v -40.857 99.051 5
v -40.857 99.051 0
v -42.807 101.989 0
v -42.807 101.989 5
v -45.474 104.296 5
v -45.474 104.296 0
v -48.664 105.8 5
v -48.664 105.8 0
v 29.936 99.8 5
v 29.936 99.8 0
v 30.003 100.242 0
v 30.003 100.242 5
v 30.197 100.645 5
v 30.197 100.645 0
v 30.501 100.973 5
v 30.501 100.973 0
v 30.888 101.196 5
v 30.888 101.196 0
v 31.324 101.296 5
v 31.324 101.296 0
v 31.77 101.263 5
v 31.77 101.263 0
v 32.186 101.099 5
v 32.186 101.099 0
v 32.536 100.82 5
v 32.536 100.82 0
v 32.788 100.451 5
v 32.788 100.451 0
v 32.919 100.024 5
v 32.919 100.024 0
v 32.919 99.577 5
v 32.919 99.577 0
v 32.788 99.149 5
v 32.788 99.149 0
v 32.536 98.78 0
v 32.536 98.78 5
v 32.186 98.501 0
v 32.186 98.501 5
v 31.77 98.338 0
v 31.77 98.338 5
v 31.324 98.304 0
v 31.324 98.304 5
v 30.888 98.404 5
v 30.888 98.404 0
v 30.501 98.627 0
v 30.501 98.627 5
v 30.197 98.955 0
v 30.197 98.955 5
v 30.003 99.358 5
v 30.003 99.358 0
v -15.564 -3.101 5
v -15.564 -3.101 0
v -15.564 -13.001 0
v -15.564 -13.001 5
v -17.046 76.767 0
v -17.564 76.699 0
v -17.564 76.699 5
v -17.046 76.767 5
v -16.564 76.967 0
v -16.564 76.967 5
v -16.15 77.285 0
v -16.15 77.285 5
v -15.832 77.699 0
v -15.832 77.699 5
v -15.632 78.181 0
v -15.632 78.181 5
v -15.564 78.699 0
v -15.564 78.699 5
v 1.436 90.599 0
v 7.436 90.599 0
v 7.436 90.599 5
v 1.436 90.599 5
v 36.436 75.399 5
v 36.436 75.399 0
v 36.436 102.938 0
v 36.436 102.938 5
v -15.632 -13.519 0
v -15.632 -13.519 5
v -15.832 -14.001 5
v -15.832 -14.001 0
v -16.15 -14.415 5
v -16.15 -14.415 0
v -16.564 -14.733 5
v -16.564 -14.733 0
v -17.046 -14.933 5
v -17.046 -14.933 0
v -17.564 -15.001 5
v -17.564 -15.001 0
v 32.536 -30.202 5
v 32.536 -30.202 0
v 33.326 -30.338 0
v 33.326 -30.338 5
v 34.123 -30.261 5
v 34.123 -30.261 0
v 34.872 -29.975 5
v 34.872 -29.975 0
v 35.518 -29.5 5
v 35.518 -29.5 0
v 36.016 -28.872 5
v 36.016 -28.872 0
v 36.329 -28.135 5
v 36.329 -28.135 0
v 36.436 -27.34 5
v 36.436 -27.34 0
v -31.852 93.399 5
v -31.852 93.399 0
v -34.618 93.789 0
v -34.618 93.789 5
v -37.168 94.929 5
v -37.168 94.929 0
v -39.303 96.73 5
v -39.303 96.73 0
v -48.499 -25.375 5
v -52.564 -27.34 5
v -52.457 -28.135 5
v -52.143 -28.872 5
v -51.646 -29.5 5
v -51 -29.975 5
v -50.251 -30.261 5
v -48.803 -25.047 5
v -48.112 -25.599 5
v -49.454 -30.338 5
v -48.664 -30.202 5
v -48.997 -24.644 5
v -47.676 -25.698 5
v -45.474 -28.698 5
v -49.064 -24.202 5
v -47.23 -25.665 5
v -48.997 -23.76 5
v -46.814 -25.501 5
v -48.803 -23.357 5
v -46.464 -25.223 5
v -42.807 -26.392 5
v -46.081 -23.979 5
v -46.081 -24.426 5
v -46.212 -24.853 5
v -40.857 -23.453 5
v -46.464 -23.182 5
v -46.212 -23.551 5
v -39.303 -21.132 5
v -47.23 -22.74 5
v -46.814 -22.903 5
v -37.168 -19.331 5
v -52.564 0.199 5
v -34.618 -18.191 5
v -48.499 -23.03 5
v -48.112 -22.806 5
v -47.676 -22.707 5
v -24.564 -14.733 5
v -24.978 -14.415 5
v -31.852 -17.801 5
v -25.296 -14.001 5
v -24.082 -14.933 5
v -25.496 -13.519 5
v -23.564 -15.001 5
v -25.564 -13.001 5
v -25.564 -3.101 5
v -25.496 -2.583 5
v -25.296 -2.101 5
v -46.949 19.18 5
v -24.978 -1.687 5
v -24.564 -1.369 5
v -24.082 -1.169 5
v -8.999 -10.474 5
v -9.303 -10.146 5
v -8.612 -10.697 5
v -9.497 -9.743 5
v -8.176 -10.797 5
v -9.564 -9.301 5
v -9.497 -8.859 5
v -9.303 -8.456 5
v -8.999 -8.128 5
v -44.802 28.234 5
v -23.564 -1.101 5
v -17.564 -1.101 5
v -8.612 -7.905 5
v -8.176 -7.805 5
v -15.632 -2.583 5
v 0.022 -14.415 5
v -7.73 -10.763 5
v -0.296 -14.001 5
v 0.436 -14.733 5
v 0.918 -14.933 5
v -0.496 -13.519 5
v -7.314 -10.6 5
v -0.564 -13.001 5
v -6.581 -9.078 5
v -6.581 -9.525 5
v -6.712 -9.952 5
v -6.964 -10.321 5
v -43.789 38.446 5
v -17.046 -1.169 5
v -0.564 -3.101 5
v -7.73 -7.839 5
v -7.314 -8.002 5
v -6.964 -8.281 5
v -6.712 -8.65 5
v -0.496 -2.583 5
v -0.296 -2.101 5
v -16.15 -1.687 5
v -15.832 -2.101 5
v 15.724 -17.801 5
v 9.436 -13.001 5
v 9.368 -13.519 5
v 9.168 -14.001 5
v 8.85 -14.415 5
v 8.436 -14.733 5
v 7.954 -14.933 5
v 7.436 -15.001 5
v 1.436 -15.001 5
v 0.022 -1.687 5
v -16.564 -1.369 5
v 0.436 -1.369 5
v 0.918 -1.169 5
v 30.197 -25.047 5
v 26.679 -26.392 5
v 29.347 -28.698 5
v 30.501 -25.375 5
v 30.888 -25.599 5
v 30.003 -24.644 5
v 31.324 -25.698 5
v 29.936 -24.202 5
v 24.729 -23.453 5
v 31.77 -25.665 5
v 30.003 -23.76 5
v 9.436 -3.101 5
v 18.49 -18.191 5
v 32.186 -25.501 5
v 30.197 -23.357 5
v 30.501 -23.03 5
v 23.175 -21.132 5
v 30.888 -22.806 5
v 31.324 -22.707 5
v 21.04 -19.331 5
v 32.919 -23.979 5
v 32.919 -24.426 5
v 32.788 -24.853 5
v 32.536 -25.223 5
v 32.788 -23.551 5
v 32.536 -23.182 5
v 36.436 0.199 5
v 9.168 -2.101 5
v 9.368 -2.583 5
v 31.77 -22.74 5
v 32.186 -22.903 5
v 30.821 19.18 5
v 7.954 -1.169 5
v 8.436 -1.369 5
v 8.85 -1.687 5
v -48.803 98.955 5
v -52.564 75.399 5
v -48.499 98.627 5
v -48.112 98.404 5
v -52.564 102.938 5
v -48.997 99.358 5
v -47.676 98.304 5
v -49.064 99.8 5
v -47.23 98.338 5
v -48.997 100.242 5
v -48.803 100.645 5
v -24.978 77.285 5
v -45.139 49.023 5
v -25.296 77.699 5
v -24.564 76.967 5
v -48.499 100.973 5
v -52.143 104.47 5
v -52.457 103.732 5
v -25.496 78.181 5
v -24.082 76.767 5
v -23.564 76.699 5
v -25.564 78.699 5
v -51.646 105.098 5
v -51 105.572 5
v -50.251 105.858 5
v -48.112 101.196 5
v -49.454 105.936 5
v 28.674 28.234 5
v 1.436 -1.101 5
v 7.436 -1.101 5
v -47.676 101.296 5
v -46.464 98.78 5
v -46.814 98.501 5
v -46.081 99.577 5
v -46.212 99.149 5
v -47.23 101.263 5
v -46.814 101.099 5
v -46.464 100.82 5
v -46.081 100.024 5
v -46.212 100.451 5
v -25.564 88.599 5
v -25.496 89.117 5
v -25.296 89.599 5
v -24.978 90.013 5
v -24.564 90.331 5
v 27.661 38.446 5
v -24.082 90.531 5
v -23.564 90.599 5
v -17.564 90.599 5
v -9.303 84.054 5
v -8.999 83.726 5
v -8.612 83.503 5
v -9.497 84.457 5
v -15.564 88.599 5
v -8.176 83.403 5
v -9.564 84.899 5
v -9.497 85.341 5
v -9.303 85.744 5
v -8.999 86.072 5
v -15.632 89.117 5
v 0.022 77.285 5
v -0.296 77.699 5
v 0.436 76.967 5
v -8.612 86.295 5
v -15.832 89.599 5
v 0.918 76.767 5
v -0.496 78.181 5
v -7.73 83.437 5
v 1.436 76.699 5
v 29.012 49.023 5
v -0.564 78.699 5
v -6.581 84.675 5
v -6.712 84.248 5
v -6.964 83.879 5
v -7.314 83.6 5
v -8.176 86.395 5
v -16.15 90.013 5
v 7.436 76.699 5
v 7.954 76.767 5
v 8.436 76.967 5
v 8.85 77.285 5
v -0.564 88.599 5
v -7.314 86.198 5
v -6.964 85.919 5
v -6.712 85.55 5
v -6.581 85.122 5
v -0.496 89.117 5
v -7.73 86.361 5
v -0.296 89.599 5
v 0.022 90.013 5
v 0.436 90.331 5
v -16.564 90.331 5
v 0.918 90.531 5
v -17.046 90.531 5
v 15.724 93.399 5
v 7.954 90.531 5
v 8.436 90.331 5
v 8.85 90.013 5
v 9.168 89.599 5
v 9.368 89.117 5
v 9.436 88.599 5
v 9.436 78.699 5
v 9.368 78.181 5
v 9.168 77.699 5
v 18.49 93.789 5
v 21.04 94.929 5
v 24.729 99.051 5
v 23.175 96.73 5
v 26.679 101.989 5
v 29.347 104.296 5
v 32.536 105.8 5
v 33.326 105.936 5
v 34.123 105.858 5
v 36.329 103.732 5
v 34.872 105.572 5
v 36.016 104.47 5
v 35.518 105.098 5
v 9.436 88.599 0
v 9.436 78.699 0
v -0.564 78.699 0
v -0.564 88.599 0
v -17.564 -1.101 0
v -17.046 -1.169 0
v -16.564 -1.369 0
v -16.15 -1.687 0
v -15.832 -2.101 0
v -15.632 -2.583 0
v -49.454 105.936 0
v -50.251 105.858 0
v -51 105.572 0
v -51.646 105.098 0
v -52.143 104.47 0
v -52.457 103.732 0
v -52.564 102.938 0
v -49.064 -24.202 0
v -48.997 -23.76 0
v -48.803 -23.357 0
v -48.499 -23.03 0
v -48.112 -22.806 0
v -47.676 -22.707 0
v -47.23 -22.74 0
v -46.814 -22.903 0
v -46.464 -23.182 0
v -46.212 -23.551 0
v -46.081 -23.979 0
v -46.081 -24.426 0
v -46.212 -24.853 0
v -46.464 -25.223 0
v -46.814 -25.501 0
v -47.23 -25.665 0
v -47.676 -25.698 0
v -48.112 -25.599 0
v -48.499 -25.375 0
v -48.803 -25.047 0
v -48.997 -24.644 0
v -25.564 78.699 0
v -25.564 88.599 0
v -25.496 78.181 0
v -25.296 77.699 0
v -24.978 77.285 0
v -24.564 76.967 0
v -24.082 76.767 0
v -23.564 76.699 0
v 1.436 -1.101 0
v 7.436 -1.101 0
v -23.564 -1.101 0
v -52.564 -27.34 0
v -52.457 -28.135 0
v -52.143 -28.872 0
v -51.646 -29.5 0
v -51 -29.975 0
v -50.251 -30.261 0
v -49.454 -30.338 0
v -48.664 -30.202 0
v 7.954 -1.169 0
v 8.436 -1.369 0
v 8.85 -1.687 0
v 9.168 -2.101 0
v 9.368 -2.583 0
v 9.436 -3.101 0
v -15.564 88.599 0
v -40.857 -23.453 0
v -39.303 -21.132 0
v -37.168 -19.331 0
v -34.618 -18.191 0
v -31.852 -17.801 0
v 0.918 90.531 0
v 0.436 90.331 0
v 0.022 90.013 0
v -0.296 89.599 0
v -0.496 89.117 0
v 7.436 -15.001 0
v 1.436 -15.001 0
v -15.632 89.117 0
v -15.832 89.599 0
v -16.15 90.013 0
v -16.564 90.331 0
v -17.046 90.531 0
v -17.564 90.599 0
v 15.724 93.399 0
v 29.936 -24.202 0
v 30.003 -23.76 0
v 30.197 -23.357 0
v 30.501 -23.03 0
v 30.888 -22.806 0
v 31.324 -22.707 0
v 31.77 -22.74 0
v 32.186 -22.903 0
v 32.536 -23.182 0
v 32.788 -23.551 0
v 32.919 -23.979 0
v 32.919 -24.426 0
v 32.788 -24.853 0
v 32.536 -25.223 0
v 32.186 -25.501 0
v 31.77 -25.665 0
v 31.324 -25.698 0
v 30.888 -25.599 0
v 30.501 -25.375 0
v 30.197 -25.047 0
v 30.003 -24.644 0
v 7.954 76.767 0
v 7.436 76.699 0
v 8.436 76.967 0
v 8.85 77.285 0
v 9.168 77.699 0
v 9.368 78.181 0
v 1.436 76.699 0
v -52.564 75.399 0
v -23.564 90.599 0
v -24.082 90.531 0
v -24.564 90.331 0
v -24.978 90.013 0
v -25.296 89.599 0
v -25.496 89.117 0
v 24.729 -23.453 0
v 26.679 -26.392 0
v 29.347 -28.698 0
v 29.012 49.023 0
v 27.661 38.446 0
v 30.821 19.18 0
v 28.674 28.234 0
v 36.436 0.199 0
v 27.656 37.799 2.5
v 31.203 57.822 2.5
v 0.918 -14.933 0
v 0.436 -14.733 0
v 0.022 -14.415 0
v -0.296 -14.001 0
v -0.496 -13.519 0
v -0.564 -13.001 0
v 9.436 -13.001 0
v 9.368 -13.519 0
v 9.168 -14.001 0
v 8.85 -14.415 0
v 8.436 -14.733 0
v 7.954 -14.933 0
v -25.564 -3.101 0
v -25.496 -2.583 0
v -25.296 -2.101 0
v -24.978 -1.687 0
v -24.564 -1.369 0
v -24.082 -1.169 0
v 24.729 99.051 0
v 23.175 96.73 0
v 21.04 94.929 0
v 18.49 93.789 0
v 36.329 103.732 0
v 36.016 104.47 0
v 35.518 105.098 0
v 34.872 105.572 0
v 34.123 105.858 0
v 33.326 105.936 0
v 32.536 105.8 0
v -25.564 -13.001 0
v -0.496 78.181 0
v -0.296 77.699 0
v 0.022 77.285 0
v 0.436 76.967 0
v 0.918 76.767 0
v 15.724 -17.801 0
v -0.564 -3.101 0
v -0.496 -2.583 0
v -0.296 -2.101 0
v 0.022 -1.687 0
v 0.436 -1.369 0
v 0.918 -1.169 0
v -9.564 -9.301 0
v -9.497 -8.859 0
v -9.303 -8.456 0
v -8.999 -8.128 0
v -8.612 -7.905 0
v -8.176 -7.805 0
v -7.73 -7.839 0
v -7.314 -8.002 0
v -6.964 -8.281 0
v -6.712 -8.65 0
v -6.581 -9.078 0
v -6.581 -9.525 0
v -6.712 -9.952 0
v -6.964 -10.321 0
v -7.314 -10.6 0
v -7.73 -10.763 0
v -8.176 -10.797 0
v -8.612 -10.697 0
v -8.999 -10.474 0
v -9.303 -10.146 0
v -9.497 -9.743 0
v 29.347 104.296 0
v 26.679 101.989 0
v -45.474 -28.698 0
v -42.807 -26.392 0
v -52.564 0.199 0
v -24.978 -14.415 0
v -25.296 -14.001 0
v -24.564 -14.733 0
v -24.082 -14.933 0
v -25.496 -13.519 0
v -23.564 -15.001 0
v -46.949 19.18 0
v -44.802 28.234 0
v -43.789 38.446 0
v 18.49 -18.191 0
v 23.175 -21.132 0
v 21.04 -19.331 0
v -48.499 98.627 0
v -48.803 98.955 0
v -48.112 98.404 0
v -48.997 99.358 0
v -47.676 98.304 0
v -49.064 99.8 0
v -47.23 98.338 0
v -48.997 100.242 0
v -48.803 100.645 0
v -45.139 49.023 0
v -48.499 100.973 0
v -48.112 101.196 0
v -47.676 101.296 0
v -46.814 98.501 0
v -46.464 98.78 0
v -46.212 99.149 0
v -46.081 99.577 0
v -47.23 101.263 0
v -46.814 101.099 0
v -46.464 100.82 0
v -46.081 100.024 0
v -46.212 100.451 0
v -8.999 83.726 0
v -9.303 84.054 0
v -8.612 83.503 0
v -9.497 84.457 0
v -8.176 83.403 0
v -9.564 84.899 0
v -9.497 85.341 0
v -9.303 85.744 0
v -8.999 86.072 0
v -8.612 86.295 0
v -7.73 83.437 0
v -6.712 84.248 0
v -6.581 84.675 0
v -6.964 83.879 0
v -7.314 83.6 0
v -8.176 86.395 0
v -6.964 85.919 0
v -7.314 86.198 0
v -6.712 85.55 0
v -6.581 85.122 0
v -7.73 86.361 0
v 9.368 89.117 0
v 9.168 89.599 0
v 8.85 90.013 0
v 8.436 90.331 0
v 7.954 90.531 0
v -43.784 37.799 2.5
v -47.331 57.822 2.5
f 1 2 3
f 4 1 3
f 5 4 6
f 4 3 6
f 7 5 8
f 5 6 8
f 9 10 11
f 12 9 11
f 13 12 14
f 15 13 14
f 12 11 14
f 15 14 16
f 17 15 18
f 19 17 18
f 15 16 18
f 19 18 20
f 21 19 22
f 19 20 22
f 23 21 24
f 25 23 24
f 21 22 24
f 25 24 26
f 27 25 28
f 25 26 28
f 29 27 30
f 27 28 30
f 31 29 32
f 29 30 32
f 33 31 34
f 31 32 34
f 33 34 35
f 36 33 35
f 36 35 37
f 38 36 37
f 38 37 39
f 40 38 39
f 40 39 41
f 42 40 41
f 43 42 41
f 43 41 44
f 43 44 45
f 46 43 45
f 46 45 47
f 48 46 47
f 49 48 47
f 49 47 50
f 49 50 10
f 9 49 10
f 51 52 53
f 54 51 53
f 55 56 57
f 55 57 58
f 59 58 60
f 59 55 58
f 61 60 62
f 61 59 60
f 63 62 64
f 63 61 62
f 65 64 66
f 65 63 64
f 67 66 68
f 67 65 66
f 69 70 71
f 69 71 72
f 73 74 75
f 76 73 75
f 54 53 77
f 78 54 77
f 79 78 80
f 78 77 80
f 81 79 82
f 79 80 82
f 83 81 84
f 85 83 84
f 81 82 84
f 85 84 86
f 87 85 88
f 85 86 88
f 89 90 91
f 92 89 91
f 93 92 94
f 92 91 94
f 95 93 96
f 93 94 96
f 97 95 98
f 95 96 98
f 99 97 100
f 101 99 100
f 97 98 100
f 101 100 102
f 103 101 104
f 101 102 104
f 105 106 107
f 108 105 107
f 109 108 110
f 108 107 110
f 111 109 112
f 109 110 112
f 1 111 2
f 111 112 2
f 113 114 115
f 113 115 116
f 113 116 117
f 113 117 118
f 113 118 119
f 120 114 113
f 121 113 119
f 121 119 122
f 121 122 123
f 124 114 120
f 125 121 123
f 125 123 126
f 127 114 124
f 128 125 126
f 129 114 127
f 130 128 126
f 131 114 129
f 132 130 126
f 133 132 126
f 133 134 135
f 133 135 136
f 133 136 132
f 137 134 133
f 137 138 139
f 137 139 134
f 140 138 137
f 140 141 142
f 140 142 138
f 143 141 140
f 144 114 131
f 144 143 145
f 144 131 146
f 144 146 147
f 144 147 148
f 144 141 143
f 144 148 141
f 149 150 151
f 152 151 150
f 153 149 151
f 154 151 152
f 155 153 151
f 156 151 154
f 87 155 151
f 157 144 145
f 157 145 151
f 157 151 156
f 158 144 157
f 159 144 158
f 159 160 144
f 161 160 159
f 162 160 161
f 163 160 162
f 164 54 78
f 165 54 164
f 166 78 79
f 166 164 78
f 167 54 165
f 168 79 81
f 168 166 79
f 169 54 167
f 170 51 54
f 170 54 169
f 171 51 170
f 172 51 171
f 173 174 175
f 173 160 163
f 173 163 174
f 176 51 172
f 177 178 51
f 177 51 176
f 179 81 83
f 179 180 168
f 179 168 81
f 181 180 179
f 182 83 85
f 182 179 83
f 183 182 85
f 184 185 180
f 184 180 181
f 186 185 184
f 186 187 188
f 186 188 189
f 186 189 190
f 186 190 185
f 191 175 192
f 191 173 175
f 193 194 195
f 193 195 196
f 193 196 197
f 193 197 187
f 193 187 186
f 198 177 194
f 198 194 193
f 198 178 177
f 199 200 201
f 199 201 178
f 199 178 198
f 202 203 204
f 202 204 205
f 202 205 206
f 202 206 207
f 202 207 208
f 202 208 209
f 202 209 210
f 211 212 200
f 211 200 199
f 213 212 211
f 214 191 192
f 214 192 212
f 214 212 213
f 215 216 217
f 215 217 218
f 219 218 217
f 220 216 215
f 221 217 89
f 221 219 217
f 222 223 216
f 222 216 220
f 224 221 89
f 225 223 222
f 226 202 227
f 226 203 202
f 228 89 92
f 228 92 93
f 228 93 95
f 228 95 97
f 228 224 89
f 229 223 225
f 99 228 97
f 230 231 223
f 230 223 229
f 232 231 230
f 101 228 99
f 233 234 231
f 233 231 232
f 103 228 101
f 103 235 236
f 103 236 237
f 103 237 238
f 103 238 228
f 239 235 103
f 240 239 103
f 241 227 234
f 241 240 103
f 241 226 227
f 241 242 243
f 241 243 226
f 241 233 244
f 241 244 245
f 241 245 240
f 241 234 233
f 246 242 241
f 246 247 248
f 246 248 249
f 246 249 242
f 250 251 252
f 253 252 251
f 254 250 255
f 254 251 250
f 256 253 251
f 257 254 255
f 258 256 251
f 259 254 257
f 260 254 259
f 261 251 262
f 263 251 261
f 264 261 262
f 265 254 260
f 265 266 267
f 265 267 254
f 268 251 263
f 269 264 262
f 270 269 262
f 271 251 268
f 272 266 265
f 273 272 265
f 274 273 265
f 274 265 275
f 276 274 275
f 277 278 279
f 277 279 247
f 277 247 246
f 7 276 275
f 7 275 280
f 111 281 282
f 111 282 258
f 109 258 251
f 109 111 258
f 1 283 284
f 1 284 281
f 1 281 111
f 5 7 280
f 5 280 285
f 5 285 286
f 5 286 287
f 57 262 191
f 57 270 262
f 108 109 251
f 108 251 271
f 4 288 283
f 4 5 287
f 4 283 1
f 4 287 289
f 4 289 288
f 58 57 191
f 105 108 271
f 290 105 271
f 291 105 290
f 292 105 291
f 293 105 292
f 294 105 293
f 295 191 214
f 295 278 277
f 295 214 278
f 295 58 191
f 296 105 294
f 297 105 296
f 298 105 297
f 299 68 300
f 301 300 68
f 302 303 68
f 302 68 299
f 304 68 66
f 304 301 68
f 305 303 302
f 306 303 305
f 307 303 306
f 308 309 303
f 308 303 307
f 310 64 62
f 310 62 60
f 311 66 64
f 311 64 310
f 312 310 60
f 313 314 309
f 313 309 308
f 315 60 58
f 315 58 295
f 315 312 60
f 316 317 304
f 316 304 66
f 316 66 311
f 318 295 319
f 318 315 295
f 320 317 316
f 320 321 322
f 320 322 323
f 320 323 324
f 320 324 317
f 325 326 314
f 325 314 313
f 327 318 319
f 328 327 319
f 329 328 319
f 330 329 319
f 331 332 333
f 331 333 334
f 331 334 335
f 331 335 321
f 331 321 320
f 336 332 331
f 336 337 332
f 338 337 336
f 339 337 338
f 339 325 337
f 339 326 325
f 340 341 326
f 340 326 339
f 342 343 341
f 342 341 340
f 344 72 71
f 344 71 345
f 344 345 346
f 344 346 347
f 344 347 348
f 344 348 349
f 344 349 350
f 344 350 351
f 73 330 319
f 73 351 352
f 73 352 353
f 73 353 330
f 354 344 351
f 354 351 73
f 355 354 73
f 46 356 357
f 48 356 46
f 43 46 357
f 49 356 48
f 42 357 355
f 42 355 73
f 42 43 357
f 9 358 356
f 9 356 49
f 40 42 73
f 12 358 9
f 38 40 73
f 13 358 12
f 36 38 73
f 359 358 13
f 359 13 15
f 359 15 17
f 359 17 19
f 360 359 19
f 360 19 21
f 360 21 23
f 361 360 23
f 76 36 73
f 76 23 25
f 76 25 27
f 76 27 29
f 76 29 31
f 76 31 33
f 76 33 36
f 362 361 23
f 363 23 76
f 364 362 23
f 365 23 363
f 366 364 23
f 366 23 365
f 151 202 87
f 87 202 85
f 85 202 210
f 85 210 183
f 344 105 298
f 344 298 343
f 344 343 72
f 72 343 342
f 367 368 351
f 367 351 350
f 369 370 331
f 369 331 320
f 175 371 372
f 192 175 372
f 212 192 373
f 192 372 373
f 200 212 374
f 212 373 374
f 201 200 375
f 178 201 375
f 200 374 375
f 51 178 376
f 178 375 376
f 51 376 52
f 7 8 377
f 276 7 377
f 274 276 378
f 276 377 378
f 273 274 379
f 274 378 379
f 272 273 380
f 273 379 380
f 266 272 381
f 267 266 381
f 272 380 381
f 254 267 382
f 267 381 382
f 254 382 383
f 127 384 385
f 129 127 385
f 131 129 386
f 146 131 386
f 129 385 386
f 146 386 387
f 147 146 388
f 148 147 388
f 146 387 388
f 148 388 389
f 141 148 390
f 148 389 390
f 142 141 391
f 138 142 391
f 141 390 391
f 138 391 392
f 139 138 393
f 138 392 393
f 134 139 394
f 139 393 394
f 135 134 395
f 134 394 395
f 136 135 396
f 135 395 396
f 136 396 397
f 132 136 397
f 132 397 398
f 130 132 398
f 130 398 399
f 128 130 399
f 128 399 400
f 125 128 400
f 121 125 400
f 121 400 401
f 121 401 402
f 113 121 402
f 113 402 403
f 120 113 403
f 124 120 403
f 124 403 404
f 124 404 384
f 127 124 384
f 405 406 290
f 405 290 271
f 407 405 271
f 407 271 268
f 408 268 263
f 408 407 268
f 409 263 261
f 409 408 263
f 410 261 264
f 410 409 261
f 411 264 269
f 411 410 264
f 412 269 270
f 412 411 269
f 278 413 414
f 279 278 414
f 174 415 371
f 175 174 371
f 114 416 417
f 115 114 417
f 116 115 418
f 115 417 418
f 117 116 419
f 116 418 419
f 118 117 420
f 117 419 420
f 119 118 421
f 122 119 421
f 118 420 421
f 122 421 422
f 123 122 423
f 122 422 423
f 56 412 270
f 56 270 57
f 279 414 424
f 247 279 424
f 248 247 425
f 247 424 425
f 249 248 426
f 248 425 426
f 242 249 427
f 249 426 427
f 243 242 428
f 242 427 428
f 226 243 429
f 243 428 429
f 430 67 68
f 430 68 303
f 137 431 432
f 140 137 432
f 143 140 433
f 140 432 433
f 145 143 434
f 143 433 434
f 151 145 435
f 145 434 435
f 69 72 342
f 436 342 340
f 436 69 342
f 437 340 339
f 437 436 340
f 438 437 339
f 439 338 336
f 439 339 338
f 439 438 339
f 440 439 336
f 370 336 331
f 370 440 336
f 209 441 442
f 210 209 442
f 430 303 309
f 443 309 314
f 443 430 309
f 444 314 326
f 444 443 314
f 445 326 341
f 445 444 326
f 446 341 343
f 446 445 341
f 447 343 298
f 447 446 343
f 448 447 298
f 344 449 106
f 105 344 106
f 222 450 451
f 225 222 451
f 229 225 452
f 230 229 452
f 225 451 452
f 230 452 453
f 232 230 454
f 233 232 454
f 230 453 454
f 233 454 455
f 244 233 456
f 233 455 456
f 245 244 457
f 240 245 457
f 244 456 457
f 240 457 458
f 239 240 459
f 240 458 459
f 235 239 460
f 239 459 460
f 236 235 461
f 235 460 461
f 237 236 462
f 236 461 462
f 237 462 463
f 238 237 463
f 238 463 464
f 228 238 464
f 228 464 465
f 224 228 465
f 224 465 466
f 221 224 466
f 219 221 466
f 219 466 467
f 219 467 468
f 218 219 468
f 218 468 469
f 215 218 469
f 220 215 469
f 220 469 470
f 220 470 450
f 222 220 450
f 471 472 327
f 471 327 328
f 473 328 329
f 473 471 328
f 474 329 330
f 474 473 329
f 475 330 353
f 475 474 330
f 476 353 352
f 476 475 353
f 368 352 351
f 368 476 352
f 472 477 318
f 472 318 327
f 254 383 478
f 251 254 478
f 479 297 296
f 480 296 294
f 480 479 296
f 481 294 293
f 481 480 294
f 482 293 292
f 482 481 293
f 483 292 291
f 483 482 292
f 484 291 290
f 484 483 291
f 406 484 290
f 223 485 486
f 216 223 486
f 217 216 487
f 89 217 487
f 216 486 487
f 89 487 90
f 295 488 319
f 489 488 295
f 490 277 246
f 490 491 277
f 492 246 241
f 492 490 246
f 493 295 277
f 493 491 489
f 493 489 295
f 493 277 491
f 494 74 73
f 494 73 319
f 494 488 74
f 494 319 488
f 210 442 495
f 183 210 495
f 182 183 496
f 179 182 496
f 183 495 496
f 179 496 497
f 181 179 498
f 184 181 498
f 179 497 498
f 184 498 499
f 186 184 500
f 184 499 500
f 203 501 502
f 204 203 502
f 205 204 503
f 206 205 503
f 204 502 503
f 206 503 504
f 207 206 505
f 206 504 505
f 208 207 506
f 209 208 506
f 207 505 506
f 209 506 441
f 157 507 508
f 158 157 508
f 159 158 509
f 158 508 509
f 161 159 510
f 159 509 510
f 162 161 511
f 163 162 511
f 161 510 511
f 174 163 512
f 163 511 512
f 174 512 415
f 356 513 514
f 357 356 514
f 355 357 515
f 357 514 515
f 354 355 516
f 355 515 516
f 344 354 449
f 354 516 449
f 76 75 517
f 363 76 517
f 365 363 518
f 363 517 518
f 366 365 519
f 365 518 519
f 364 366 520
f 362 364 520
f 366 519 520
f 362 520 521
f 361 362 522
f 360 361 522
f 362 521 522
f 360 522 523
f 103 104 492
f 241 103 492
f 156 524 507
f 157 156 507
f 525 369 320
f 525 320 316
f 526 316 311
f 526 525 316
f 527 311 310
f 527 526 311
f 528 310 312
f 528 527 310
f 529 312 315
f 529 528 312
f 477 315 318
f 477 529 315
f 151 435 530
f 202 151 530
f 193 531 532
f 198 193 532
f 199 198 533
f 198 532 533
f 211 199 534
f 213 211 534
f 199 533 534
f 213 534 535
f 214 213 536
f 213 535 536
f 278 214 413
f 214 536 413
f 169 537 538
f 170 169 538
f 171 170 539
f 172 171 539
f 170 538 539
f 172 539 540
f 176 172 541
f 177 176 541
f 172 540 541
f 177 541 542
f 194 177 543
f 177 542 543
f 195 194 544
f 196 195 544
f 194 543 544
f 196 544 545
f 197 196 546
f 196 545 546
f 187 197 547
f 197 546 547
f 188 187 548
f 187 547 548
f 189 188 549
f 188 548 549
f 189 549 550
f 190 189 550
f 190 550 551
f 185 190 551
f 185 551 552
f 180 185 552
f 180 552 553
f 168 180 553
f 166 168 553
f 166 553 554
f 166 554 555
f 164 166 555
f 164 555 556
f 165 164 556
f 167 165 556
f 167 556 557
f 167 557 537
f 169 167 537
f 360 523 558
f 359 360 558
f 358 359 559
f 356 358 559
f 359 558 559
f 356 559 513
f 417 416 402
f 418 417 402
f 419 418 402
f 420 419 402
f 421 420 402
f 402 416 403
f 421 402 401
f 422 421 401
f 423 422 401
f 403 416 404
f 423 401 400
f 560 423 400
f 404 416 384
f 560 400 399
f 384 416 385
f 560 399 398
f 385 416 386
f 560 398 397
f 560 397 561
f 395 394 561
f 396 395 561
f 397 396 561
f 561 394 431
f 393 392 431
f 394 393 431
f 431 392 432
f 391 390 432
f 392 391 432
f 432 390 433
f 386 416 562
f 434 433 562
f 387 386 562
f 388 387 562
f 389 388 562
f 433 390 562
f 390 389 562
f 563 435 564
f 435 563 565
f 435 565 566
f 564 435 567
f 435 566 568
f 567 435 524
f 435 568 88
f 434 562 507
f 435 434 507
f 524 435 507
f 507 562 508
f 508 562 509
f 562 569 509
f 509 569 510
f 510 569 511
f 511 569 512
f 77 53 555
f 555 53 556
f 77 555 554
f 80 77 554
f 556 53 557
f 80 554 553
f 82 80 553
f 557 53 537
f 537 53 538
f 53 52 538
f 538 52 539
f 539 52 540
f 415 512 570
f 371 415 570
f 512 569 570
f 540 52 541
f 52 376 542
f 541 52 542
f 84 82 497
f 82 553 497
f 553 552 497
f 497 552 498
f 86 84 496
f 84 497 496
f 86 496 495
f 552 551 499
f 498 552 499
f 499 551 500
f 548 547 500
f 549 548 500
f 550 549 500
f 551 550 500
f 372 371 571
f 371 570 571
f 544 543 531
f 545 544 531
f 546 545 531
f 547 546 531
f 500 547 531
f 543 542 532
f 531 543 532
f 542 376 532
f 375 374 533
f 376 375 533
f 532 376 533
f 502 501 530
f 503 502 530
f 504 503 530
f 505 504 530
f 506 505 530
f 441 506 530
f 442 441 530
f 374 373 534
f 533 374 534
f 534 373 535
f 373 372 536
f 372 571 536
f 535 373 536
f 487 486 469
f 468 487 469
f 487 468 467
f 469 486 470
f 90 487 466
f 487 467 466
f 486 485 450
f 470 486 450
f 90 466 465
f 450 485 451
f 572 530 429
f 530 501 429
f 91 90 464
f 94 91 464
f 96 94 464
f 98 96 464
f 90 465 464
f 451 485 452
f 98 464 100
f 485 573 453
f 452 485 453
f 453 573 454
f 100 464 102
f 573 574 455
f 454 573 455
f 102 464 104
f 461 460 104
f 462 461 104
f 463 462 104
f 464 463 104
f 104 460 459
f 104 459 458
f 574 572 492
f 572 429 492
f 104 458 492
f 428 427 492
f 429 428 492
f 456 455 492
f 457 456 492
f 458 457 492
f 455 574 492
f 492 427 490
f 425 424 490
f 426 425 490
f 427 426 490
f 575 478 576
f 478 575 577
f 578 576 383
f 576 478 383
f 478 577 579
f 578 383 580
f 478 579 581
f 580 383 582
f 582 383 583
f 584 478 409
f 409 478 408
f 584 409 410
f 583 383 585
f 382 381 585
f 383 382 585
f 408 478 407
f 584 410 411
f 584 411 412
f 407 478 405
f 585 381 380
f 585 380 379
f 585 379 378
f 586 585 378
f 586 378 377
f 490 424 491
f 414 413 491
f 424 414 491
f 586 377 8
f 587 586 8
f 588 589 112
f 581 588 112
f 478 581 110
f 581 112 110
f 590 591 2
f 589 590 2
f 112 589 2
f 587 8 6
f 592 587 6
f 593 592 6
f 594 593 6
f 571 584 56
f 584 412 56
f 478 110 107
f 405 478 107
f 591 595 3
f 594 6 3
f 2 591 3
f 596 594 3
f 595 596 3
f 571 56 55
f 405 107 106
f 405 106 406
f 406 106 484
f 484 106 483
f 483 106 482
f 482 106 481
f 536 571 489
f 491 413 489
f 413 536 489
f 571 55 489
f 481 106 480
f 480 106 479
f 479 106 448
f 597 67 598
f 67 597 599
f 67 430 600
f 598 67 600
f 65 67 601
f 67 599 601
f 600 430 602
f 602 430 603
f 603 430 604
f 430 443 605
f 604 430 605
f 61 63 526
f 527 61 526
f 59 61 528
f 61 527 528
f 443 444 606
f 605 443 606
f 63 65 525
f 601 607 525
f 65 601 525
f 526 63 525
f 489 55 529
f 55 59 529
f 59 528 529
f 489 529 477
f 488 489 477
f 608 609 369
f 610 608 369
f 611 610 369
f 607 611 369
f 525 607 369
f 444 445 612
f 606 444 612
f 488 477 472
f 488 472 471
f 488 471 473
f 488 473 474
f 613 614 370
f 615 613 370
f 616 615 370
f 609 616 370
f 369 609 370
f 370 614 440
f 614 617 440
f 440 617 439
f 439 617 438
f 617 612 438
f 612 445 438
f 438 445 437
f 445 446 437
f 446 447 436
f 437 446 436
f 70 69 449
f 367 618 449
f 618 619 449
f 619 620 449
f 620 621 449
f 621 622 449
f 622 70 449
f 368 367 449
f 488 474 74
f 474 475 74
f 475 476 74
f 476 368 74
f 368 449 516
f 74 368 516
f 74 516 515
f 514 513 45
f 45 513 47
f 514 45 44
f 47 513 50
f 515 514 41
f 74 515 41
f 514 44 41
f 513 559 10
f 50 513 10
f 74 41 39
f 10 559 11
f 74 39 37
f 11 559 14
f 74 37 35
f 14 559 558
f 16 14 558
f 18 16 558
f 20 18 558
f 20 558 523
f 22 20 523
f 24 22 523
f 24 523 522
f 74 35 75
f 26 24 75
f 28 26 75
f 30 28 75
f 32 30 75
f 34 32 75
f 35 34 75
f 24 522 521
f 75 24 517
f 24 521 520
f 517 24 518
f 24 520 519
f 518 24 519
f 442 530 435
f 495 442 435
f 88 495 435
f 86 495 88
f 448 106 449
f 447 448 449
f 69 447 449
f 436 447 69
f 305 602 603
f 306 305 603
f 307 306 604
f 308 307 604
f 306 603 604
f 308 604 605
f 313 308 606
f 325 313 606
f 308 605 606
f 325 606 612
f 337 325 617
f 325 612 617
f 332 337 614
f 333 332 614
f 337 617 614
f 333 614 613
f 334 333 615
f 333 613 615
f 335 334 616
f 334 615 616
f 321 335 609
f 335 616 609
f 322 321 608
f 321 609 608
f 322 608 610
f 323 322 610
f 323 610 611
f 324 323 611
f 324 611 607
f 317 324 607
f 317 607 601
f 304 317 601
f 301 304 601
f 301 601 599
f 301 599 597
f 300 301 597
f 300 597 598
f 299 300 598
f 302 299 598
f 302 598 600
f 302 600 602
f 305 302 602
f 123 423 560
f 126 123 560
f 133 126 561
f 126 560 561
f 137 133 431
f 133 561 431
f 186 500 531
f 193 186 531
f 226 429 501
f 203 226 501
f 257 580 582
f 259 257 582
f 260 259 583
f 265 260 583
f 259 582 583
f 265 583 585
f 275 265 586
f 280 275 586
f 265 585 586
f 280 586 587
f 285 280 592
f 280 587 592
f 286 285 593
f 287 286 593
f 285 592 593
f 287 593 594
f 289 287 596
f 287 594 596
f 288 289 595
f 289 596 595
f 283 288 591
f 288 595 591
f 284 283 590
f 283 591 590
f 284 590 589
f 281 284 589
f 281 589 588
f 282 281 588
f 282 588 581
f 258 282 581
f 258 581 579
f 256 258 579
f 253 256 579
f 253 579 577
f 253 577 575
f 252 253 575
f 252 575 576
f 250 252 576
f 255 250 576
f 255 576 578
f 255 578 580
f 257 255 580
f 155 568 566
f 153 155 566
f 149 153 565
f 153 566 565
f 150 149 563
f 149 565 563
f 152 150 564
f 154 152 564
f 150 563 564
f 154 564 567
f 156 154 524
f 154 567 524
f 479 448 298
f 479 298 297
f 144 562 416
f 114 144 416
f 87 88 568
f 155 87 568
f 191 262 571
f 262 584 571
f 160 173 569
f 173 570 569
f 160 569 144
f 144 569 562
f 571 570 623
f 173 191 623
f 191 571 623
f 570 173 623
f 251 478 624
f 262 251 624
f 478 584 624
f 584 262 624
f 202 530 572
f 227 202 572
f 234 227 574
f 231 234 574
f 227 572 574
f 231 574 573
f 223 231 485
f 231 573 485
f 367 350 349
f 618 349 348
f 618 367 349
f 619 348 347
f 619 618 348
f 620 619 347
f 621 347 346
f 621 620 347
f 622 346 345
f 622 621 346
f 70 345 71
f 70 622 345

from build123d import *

# Parameters (mm, degrees)
RESSALTO_EXTRUS_O3_DEPTH = 5
ESBO_O4_R                = 1.5
CORTE_EXTRUS_O3_DEPTH    = 10


with BuildPart() as part:
    # Esboço1 → Ressalto-extrusão3 (new body)
    with BuildSketch(Plane.XY):
        with BuildLine():
            Line((-31.851570772, -17.801096987), (-27.063885949, -17.801096987))
            Line((-27.063885949, -17.801096987), (10.936114051, -17.801096987))
            Line((10.936114051, -17.801096987), (15.723798874, -17.801096987))
            ThreePointArc((15.723798874, -17.801096987), (21.039894205, -19.331201448), (24.729153299, -23.4532709))
            ThreePointArc((24.729153299, -23.4532709), (27.934250919, -27.635644423), (32.536114051, -30.202306605))
            ThreePointArc((32.536114051, -30.202306605), (35.210937986, -29.759166326), (36.436114051, -27.340489001))
            Line((36.436114051, -27.340489001), (36.436114051, -17.801096987))
            Line((36.436114051, -17.801096987), (36.436114051, 0.198903013))
            add(Edge.make_bspline(
                [(36.436114051, 75.398903013), (24.729153299, 37.798903013), (36.436114051, 0.198903013)],
                knots=[0, 0, 0, 1, 1, 1], degree=2, weights=[1, 3, 1]))
            Line((36.436114051, 75.398903013), (36.436114051, 93.398903013))
            Line((36.436114051, 93.398903013), (36.436114051, 102.938295027))
            ThreePointArc((36.436114051, 102.938295027), (35.210937986, 105.356972352), (32.536114051, 105.800112631))
            ThreePointArc((32.536114051, 105.800112631), (27.934250919, 103.23345045), (24.729153299, 99.051076926))
            ThreePointArc((24.729153299, 99.051076926), (21.039894205, 94.929007474), (15.723798874, 93.398903013))
            Line((15.723798874, 93.398903013), (10.936114051, 93.398903013))
            Line((10.936114051, 93.398903013), (-27.063885949, 93.398903013))
            Line((-27.063885949, 93.398903013), (-31.851570772, 93.398903013))
            ThreePointArc((-31.851570772, 93.398903013), (-37.167666102, 94.929007474), (-40.856925197, 99.051076926))
            ThreePointArc((-40.856925197, 99.051076926), (-44.062022817, 103.23345045), (-48.663885949, 105.800112631))
            ThreePointArc((-48.663885949, 105.800112631), (-51.338709884, 105.356972352), (-52.563885949, 102.938295027))
            Line((-52.563885949, 102.938295027), (-52.563885949, 93.398903013))
            Line((-52.563885949, 93.398903013), (-52.563885949, 75.398903013))
            add(Edge.make_bspline(
                [(-52.563885949, 75.398903013), (-40.856925197, 37.798903013), (-52.563885949, 0.198903013)],
                knots=[0, 0, 0, 1, 1, 1], degree=2, weights=[1, 3, 1]))
            Line((-52.563885949, 0.198903013), (-52.563885949, -17.801096987))
            Line((-52.563885949, -17.801096987), (-52.563885949, -27.340489001))
            ThreePointArc((-52.563885949, -27.340489001), (-51.338709884, -29.759166326), (-48.663885949, -30.202306605))
            ThreePointArc((-48.663885949, -30.202306605), (-44.062022817, -27.635644423), (-40.856925197, -23.4532709))
            ThreePointArc((-40.856925197, -23.4532709), (-37.167666102, -19.331201448), (-31.851570772, -17.801096987))
        make_face()
    extrude(amount=RESSALTO_EXTRUS_O3_DEPTH)

    # Esboço4 → Corte-extrusão3 (cut)
    with BuildSketch(Plane(origin=(0, 0, 0), x_dir=(-1, 0, 0), z_dir=(0, 0, -1))):
        with Locations((-31.436114051, 99.800112631)):
            Circle(ESBO_O4_R)
        with Locations((47.563885949, 99.800112631)):
            Circle(ESBO_O4_R)
        with Locations((8.063885949, 84.898903013)):
            Circle(ESBO_O4_R)
        with Locations((8.063885949, -9.301096987)):
            Circle(ESBO_O4_R)
        with Locations((47.563885949, -24.202306605)):
            Circle(ESBO_O4_R)
        with Locations((-31.436114051, -24.202306605)):
            Circle(ESBO_O4_R)
        with BuildLine():
            Line((-7.436114051, 90.598903013), (-1.436114051, 90.598903013))
            ThreePointArc((-1.436114051, 90.598903013), (-0.021900489, 90.013116575), (0.563885949, 88.598903013))
            Line((0.563885949, 88.598903013), (0.563885949, 78.698903013))
            ThreePointArc((0.563885949, 78.698903013), (-0.021900489, 77.284689451), (-1.436114051, 76.698903013))
            Line((-1.436114051, 76.698903013), (-7.436114051, 76.698903013))
            ThreePointArc((-7.436114051, 76.698903013), (-8.850327613, 77.284689451), (-9.436114051, 78.698903013))
            Line((-9.436114051, 78.698903013), (-9.436114051, 88.598903013))
            ThreePointArc((-9.436114051, 88.598903013), (-8.850327613, 90.013116575), (-7.436114051, 90.598903013))
        make_face()
        with BuildLine():
            Line((17.563885949, 90.598903013), (23.563885949, 90.598903013))
            ThreePointArc((23.563885949, 90.598903013), (24.978099511, 90.013116575), (25.563885949, 88.598903013))
            Line((25.563885949, 88.598903013), (25.563885949, 78.698903013))
            ThreePointArc((25.563885949, 78.698903013), (24.978099511, 77.284689451), (23.563885949, 76.698903013))
            Line((23.563885949, 76.698903013), (17.563885949, 76.698903013))
            ThreePointArc((17.563885949, 76.698903013), (16.149672387, 77.284689451), (15.563885949, 78.698903013))
            Line((15.563885949, 78.698903013), (15.563885949, 88.598903013))
            ThreePointArc((15.563885949, 88.598903013), (16.149672387, 90.013116575), (17.563885949, 90.598903013))
        make_face()
        with BuildLine():
            Line((25.563885949, -13.001096987), (25.563885949, -3.101096987))
            ThreePointArc((25.563885949, -3.101096987), (24.978099511, -1.686883425), (23.563885949, -1.101096987))
            Line((23.563885949, -1.101096987), (17.563885949, -1.101096987))
            ThreePointArc((17.563885949, -1.101096987), (16.149672387, -1.686883425), (15.563885949, -3.101096987))
            Line((15.563885949, -3.101096987), (15.563885949, -13.001096987))
            ThreePointArc((15.563885949, -13.001096987), (16.149672387, -14.415310549), (17.563885949, -15.001096987))
            Line((17.563885949, -15.001096987), (23.563885949, -15.001096987))
            ThreePointArc((23.563885949, -15.001096987), (24.978099511, -14.415310549), (25.563885949, -13.001096987))
        make_face()
        with BuildLine():
            Line((0.563885949, -13.001096987), (0.563885949, -3.101096987))
            ThreePointArc((0.563885949, -3.101096987), (-0.021900489, -1.686883425), (-1.436114051, -1.101096987))
            Line((-1.436114051, -1.101096987), (-7.436114051, -1.101096987))
            ThreePointArc((-7.436114051, -1.101096987), (-8.850327613, -1.686883425), (-9.436114051, -3.101096987))
            Line((-9.436114051, -3.101096987), (-9.436114051, -13.001096987))
            ThreePointArc((-9.436114051, -13.001096987), (-8.850327613, -14.415310549), (-7.436114051, -15.001096987))
            Line((-7.436114051, -15.001096987), (-1.436114051, -15.001096987))
            ThreePointArc((-1.436114051, -15.001096987), (-0.021900489, -14.415310549), (0.563885949, -13.001096987))
        make_face()
    extrude(amount=-CORTE_EXTRUS_O3_DEPTH, mode=Mode.SUBTRACT)


solid = part.part
